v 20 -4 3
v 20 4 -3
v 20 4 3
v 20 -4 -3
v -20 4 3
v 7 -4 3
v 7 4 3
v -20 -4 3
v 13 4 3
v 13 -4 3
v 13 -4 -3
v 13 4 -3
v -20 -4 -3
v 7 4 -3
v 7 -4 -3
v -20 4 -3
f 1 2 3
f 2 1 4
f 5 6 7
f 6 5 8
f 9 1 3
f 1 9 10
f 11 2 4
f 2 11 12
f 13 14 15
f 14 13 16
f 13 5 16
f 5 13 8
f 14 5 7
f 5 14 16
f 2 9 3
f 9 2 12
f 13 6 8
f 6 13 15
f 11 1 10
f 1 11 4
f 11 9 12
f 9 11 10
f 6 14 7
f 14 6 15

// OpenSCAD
// Placeholder starter.scad for Snap Fit Clip
// Simple clip-like placeholder geometry
module clip(){
  difference(){
    cube([40,8,6], center=true);
    translate([10,0,0]) cube([6,8,6], center=true);
  }
}
clip();
